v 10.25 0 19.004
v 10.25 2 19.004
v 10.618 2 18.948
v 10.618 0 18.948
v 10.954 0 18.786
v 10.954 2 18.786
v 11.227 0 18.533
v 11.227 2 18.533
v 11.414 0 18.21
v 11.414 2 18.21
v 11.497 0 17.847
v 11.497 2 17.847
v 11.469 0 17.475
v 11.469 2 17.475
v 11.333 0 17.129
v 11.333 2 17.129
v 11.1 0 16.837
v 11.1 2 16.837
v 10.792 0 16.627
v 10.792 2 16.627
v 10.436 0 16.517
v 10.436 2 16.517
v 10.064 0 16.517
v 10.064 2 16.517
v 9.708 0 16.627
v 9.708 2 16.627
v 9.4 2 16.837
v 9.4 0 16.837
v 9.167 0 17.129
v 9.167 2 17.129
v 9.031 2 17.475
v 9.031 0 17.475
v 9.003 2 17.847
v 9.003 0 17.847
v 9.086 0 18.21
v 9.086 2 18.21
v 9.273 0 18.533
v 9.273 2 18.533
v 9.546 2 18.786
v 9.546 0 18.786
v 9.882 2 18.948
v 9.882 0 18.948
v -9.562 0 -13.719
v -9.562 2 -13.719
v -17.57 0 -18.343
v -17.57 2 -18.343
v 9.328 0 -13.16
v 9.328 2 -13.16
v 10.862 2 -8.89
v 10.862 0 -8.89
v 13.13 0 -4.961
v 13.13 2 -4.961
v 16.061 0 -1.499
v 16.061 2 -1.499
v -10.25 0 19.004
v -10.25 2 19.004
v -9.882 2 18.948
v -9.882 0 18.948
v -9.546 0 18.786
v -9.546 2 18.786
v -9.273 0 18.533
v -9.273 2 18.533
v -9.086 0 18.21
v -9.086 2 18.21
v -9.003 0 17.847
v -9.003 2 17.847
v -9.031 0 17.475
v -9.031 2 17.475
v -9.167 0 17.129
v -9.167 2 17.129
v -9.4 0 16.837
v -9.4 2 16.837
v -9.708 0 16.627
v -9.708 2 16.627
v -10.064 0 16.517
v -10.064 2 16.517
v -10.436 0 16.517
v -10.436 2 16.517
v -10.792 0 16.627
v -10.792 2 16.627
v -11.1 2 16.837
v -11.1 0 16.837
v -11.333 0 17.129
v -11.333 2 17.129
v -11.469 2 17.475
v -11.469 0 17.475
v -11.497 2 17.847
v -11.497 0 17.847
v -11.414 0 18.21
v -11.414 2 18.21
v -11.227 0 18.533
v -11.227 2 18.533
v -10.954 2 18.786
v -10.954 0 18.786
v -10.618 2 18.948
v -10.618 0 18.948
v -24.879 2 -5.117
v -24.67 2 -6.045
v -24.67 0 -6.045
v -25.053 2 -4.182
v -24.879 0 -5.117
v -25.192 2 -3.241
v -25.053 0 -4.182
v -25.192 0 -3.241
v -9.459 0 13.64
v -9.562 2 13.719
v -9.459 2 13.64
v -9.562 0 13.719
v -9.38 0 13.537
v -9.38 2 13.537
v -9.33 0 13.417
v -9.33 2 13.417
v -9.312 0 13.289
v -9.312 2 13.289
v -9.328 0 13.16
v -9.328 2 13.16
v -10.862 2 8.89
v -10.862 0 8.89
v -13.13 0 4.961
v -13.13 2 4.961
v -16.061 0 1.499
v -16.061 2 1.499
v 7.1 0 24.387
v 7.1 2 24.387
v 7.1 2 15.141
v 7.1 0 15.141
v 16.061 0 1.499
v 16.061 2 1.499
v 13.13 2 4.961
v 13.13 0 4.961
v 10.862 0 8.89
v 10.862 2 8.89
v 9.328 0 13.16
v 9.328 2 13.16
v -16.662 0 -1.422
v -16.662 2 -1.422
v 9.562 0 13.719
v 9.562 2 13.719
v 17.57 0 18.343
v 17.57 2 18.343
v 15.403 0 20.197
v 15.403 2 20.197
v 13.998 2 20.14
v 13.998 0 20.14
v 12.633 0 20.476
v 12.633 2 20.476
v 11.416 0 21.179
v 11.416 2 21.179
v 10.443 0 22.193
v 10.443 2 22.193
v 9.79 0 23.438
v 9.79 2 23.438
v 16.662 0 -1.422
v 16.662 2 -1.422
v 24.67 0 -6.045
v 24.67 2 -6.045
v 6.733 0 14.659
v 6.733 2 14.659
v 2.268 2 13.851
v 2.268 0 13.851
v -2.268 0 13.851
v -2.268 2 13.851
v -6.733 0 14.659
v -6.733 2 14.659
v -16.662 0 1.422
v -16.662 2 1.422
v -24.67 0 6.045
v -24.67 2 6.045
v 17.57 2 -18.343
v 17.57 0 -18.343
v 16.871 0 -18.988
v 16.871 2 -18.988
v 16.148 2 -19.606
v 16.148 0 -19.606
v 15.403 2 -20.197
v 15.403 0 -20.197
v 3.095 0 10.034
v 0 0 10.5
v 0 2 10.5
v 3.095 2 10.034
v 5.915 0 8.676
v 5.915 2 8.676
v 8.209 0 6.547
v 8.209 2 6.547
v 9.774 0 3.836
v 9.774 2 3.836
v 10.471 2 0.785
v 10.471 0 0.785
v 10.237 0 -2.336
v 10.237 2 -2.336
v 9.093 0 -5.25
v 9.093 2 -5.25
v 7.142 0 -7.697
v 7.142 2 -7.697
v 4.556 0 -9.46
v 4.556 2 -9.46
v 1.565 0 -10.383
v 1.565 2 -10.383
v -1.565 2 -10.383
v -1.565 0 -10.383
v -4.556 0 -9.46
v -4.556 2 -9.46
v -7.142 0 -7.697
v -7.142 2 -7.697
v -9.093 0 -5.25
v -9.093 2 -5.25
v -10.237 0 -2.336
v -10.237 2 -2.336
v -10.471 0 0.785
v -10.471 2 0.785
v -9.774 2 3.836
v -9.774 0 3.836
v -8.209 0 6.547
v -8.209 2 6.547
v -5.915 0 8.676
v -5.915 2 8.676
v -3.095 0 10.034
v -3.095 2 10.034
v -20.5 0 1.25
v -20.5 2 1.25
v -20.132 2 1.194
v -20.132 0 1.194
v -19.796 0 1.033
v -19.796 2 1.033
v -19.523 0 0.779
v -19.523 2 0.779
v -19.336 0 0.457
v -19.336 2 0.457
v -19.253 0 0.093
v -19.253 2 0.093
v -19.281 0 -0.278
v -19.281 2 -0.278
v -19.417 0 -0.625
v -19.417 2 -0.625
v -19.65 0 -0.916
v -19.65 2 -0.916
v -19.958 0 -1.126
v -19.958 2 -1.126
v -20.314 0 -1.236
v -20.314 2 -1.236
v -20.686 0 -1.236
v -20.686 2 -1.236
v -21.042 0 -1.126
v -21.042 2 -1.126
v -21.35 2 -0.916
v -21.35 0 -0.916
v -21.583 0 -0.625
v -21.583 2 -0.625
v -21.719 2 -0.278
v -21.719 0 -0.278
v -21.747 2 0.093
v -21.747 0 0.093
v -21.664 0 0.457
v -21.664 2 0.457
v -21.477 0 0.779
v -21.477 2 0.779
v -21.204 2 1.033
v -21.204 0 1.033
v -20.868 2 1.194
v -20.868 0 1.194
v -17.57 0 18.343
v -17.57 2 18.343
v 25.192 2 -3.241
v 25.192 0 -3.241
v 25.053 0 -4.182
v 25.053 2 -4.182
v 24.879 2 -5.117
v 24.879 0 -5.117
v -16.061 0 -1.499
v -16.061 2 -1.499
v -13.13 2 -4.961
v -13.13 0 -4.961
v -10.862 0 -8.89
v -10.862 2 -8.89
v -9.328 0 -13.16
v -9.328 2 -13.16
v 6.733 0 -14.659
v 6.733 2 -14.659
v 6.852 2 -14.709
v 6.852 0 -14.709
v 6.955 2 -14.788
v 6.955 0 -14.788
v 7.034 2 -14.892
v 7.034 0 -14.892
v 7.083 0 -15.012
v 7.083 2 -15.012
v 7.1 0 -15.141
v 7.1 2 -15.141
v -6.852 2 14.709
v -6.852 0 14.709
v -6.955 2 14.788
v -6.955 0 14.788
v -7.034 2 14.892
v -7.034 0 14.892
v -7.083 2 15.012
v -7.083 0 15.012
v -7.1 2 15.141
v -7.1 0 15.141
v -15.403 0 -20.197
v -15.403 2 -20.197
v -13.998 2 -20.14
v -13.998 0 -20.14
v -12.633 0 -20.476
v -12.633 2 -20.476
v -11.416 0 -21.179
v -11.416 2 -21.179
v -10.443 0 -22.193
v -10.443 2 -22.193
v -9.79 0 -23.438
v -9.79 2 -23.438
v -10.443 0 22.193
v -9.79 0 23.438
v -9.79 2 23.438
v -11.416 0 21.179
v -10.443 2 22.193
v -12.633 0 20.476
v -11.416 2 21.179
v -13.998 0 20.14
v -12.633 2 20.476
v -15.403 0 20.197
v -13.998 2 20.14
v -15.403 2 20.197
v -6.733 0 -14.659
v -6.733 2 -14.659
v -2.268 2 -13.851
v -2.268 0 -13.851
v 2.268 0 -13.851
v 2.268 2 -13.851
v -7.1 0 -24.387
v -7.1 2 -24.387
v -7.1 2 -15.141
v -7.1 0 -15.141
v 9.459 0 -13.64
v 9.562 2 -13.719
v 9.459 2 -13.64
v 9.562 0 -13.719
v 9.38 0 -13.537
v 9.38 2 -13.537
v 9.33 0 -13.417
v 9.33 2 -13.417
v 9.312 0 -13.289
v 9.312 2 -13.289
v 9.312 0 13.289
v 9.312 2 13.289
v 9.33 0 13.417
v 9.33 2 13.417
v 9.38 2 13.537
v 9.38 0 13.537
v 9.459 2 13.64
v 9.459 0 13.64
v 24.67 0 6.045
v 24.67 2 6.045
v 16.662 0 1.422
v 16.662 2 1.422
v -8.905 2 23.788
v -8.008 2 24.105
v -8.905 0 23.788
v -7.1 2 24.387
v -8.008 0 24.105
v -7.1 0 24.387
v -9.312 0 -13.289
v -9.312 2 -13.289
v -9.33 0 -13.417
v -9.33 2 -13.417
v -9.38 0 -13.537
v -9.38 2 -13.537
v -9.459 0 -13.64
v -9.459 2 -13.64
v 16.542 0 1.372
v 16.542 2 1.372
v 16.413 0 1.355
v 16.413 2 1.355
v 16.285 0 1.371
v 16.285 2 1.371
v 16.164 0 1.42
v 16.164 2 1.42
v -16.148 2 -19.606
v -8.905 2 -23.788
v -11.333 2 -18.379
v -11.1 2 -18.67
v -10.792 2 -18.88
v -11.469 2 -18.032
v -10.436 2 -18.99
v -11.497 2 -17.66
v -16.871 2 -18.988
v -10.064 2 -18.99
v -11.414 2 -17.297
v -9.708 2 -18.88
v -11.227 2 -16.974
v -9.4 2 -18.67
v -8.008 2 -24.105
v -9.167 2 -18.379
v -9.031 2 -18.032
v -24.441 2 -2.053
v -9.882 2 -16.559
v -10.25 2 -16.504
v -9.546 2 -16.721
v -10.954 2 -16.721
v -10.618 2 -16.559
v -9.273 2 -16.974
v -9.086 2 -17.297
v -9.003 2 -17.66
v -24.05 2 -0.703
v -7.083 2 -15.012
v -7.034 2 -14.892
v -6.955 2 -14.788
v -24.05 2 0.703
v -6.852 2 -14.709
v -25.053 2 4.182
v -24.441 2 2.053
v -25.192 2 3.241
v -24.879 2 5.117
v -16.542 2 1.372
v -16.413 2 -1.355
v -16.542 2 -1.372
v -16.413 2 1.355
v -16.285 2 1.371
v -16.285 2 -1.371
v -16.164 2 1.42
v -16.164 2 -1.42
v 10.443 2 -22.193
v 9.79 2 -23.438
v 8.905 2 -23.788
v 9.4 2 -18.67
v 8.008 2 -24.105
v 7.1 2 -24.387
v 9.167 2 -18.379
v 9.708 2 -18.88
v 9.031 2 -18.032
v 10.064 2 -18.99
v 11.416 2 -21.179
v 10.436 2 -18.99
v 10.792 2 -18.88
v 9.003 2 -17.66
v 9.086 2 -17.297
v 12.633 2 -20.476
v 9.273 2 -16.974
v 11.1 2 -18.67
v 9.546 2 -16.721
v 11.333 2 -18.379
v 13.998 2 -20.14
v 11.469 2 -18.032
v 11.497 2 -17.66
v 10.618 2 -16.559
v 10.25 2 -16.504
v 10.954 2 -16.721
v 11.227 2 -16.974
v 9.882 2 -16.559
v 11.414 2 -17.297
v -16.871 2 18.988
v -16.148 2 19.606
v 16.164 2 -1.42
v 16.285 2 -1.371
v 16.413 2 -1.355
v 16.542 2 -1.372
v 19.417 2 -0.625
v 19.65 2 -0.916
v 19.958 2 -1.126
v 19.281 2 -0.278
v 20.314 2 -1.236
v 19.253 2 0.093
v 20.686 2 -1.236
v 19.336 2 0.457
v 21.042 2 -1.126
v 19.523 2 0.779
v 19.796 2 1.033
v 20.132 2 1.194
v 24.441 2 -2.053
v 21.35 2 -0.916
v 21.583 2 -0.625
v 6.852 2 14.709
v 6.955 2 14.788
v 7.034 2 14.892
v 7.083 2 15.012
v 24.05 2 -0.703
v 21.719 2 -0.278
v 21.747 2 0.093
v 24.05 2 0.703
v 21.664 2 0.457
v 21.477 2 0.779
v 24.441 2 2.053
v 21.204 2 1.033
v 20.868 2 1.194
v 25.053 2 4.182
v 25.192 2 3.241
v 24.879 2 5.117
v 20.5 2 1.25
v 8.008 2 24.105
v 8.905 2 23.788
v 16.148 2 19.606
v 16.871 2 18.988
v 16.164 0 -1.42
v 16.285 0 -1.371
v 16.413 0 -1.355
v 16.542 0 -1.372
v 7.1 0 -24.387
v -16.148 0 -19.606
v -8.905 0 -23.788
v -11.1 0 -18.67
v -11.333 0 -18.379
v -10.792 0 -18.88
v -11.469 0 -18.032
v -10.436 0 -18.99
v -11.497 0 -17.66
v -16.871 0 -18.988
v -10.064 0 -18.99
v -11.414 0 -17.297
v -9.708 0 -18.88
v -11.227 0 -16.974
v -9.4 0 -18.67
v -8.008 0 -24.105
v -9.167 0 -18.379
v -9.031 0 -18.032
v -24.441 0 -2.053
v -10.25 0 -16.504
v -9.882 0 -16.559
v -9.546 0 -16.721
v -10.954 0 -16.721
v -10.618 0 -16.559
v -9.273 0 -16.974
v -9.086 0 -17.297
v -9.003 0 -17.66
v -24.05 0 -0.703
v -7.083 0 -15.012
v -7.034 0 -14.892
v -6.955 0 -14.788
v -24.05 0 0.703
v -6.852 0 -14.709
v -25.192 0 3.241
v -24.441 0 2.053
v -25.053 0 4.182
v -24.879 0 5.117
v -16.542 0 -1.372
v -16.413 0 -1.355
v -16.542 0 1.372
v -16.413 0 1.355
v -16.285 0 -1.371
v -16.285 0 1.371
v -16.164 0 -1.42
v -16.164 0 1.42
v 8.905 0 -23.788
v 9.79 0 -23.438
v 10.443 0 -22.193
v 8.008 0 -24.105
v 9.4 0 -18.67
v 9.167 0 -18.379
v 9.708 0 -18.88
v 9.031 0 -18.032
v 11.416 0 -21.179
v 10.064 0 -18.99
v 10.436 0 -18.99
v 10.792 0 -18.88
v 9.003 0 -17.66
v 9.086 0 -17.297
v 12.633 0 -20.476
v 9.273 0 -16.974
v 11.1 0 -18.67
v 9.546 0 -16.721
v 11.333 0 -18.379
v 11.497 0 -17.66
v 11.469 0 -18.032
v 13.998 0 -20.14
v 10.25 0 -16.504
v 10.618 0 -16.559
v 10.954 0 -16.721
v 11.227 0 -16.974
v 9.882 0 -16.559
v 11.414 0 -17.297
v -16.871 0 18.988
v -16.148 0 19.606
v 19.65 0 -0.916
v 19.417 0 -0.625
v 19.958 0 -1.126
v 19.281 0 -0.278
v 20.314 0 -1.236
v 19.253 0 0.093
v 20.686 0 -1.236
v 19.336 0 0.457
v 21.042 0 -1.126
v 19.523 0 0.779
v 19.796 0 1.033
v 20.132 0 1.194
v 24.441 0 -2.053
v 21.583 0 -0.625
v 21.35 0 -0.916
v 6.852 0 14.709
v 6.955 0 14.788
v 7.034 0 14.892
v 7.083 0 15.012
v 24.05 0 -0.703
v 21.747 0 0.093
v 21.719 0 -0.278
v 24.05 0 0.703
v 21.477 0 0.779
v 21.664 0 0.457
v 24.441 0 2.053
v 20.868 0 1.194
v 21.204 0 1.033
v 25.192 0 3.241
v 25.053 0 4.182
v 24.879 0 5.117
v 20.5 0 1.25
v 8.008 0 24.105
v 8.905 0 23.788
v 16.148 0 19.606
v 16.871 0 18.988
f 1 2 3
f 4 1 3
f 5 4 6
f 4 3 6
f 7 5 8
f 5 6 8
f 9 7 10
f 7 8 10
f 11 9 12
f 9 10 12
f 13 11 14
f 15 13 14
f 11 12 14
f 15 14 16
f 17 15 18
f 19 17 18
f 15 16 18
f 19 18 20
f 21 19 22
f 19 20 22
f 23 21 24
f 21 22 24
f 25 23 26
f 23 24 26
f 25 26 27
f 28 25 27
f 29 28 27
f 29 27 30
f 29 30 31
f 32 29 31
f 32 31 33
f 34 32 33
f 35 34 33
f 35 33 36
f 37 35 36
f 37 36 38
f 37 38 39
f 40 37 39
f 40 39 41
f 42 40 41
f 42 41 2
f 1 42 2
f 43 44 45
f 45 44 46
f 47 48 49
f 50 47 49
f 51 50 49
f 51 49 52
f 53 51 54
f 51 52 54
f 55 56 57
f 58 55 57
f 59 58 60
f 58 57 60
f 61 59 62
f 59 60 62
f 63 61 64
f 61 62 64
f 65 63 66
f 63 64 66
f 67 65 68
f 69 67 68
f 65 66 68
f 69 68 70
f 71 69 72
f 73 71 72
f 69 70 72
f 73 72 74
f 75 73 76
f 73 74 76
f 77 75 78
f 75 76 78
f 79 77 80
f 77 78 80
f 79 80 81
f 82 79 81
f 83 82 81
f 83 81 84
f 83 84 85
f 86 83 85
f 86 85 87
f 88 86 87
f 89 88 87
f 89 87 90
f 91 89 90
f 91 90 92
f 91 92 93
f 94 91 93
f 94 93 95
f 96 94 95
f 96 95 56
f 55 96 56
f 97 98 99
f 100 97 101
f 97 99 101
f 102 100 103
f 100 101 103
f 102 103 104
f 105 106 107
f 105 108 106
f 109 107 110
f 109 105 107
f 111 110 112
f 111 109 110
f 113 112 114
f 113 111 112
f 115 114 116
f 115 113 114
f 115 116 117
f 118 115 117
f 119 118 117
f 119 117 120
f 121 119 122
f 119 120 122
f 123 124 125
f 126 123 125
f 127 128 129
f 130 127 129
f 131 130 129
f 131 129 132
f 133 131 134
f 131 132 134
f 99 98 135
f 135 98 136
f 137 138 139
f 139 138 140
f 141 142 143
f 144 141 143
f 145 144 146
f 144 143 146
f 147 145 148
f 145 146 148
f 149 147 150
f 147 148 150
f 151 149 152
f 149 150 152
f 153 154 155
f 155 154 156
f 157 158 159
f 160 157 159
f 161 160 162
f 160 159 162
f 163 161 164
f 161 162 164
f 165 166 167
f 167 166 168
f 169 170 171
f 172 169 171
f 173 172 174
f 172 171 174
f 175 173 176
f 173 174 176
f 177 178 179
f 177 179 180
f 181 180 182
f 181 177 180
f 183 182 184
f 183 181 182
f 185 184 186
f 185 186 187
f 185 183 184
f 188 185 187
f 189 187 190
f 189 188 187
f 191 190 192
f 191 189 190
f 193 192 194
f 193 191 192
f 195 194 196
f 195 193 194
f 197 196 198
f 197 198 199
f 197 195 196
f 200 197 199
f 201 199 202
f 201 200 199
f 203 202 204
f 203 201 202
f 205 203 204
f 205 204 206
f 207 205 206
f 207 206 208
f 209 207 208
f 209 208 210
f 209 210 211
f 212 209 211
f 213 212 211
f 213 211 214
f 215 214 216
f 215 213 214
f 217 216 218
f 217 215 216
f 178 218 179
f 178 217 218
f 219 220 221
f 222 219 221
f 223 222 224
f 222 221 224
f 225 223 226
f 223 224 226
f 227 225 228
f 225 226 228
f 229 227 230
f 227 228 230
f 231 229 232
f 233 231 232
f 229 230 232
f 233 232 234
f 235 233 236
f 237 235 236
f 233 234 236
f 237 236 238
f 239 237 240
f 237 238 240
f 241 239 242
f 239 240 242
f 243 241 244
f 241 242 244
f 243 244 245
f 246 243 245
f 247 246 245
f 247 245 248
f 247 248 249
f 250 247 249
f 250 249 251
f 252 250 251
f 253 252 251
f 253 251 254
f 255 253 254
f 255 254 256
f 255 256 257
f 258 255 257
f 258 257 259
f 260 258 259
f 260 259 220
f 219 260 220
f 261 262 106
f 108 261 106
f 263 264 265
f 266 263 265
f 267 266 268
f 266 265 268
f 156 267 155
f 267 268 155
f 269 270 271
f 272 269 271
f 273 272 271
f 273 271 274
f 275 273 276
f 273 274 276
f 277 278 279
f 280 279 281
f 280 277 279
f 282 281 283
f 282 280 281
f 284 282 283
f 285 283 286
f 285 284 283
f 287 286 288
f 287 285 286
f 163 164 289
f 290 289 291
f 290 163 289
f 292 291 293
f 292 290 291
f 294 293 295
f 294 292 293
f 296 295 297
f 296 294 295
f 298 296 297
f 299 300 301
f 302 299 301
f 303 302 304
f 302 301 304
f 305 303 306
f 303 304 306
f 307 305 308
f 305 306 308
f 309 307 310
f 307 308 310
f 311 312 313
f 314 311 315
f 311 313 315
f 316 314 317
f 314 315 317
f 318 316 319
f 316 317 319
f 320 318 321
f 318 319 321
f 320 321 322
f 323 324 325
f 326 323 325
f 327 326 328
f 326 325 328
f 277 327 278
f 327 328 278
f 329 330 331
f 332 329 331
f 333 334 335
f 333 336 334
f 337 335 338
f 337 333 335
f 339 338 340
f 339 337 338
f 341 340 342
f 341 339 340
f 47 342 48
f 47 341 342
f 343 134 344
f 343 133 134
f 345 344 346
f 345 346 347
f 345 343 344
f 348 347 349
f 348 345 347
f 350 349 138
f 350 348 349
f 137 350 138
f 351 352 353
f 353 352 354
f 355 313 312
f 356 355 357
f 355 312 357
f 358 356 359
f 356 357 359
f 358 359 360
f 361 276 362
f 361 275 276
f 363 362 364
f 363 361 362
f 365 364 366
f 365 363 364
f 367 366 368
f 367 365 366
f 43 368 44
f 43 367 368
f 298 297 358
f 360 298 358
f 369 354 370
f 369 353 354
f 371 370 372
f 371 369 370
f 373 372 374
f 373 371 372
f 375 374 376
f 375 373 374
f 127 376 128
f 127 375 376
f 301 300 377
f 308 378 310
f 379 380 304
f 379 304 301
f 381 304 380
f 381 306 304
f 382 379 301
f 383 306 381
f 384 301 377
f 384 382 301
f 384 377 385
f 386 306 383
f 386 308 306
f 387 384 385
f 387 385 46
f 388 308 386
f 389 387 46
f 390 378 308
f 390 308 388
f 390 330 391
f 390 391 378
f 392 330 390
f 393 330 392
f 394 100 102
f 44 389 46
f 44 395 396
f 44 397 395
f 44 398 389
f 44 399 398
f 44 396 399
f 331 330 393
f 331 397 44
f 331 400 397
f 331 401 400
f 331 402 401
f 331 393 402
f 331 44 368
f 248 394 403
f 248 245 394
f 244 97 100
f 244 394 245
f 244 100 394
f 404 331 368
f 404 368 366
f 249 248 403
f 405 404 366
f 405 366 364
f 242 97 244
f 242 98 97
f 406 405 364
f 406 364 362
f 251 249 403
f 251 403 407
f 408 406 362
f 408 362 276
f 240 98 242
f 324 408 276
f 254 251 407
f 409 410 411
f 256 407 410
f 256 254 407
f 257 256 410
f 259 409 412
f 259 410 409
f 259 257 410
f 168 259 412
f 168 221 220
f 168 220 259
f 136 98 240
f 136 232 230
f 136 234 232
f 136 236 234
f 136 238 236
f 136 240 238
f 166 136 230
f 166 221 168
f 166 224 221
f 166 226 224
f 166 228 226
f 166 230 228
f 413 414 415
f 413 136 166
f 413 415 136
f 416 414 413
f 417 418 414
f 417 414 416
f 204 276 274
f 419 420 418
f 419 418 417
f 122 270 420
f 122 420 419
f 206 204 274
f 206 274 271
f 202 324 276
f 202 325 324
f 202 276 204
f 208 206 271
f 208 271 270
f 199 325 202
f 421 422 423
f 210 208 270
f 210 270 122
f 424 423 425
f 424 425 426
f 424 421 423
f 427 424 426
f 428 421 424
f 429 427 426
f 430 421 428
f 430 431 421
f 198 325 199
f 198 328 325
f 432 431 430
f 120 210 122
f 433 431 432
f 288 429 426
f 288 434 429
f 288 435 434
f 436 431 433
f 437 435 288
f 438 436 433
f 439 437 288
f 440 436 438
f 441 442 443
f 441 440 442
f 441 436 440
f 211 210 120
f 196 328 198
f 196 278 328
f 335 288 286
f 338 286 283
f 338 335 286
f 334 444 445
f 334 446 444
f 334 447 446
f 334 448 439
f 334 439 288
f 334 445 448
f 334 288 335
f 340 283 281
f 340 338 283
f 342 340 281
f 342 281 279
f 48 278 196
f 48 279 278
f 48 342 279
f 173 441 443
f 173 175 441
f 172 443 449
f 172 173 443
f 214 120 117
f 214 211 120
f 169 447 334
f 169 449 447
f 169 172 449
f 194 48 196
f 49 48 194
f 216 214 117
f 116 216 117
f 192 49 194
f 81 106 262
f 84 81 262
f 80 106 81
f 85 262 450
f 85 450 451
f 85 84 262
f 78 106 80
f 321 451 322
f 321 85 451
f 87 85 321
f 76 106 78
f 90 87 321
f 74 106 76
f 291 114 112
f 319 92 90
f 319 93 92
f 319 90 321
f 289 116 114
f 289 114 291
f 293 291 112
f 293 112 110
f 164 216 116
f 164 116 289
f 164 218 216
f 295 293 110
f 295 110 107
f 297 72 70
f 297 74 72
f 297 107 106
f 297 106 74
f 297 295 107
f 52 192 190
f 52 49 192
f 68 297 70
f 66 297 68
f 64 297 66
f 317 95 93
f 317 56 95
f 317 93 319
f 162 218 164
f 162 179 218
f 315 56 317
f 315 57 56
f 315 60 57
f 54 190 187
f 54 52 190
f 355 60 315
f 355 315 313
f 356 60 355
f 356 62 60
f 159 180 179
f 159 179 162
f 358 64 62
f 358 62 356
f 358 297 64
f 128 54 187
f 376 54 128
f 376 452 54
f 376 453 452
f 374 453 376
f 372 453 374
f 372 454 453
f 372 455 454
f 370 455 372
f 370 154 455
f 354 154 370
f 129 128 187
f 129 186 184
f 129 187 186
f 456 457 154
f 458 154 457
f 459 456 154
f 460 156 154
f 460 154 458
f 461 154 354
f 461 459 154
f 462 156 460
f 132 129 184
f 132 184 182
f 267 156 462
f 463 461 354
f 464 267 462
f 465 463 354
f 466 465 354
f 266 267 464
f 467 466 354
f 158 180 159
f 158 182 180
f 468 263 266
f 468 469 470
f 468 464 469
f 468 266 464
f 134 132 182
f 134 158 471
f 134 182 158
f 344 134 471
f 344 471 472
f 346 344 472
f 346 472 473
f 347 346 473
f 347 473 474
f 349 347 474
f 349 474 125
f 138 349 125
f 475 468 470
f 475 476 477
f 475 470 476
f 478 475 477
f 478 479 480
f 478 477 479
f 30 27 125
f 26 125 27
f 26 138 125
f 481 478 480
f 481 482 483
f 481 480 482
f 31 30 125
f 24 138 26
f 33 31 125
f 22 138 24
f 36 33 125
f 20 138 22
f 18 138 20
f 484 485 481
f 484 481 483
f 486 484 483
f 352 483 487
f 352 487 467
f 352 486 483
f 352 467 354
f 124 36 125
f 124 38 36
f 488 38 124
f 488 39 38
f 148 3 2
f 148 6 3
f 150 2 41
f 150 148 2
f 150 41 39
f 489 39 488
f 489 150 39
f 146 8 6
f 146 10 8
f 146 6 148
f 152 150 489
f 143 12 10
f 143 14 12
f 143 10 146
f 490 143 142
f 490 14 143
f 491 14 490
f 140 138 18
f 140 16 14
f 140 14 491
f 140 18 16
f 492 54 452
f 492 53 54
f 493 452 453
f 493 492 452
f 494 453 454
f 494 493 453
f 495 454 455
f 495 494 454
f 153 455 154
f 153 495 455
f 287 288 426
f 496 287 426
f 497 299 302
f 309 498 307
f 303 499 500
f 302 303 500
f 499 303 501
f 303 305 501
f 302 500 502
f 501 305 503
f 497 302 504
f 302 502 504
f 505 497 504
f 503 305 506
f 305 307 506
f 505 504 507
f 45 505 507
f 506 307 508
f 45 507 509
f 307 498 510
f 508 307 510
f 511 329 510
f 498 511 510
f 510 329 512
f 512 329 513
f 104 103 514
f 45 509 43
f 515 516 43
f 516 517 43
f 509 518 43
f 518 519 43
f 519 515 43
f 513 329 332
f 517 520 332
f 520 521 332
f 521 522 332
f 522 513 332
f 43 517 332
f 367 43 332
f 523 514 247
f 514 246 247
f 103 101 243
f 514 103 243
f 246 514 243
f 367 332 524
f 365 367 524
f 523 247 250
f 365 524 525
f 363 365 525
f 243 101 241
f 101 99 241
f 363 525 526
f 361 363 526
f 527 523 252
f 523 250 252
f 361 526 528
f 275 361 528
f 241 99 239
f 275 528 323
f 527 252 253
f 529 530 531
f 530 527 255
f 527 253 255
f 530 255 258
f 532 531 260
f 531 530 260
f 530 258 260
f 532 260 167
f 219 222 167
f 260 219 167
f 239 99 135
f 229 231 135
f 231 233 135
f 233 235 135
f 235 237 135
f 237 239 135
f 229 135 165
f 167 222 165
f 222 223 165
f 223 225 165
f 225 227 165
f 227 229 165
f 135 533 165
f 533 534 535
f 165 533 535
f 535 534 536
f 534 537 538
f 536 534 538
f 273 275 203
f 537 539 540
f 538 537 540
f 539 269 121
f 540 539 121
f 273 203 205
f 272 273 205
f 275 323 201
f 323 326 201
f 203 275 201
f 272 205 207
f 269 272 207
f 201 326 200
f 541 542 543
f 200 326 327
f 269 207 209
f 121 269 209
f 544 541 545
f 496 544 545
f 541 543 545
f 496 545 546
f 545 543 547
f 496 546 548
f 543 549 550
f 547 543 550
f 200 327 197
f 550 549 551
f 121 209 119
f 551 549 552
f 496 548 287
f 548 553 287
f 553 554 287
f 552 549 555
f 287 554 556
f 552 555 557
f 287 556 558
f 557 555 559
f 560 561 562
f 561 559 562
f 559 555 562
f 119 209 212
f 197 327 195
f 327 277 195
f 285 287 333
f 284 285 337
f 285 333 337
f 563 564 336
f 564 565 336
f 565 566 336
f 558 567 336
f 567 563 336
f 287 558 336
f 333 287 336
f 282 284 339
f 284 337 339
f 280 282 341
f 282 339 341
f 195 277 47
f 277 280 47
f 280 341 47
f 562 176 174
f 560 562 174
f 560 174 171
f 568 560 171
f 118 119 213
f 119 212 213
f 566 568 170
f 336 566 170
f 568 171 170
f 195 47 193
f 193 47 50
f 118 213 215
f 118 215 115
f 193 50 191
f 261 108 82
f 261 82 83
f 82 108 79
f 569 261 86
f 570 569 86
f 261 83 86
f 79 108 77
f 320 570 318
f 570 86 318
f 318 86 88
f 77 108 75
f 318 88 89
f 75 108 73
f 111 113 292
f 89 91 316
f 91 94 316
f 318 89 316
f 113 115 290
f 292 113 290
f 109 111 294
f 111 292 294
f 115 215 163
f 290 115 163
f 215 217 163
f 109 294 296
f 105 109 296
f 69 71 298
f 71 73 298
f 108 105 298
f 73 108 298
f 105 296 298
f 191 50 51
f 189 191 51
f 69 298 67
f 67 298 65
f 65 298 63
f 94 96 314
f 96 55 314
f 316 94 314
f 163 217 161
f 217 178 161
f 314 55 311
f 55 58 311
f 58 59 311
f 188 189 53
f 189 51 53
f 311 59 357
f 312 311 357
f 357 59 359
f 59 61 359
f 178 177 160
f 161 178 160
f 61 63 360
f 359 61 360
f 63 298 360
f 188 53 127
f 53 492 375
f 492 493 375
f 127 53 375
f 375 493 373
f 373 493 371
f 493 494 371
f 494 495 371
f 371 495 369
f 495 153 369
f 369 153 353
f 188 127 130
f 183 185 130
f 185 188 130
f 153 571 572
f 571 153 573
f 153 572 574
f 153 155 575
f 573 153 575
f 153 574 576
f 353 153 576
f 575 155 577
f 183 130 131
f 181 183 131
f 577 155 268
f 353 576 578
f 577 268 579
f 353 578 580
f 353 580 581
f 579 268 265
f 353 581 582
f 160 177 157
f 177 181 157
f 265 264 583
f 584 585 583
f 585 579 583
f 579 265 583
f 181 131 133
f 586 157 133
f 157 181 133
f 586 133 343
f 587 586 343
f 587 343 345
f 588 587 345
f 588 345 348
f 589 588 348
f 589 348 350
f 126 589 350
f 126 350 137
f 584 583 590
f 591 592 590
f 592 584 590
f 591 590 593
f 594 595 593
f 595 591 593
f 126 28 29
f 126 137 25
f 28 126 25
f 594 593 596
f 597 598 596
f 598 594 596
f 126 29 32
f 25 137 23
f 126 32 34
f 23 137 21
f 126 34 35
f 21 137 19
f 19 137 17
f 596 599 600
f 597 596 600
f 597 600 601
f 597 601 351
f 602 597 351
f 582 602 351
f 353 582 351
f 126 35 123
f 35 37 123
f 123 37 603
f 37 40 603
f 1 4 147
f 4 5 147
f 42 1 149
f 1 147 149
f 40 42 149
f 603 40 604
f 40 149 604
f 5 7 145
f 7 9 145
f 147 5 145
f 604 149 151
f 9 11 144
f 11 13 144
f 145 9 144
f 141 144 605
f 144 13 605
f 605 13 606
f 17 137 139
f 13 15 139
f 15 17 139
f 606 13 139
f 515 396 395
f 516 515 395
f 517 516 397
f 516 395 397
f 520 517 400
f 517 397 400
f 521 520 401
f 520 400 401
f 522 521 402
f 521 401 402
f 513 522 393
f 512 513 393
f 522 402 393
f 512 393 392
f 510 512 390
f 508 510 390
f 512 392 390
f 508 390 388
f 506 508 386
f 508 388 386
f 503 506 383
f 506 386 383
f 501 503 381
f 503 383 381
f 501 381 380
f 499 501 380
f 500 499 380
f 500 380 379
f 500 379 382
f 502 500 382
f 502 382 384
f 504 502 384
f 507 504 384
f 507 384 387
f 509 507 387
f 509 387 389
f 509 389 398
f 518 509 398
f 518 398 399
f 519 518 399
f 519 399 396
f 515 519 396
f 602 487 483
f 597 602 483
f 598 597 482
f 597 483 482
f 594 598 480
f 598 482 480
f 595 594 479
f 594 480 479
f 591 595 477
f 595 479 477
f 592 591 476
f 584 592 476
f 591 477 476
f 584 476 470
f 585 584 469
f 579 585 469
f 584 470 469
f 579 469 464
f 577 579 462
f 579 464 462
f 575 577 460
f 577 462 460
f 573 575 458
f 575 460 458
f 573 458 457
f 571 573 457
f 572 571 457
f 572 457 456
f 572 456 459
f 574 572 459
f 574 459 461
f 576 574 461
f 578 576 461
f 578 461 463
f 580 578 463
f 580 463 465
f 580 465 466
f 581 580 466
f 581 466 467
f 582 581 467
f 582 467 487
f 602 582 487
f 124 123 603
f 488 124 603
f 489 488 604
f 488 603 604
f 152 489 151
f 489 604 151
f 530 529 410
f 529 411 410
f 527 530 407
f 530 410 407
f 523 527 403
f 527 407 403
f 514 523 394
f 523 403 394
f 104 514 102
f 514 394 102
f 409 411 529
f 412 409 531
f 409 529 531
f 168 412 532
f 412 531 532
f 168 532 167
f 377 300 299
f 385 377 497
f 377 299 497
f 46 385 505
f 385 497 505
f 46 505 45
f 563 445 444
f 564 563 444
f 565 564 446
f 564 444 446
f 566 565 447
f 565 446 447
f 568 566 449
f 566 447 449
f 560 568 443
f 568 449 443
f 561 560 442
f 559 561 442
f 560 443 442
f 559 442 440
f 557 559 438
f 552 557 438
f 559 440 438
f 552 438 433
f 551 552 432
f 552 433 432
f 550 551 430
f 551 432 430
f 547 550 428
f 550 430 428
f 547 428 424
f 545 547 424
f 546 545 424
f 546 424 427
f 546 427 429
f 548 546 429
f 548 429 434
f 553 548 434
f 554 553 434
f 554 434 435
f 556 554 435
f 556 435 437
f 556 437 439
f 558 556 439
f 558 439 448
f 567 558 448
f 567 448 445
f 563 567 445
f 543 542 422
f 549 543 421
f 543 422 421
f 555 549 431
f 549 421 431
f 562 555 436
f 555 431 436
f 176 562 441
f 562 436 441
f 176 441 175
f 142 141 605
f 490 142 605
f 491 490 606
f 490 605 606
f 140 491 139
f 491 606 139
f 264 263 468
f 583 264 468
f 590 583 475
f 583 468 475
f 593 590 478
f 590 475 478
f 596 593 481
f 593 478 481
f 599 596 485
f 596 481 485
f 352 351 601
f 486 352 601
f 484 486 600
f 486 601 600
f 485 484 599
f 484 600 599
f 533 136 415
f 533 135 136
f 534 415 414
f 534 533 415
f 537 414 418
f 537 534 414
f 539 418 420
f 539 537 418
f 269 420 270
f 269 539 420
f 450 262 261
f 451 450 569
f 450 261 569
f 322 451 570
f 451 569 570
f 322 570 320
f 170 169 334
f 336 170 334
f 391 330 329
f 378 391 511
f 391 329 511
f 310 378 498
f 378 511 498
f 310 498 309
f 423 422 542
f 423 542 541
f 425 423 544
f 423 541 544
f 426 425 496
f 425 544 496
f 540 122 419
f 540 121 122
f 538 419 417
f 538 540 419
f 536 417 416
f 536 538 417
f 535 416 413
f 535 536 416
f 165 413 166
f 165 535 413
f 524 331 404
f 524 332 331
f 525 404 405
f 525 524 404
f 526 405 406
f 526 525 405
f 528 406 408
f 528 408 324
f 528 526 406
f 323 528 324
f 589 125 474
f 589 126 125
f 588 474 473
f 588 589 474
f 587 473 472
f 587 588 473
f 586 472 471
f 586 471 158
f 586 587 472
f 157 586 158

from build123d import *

# Parameters (mm, degrees)
SKETCH_1_R          = 25.4
SKETCH_1_R_2        = 10.5
EXTRUDE_1_DEPTH     = 2
CUT_EXTRUDE_1_DEPTH = 36.9766591
SKETCH_3_R          = 1.25
SKETCH_3_R_2        = 5
CUT_EXTRUDE_2_DEPTH = 36.269108296
FILLET_1_R          = 0.5


with BuildPart() as part:
    # 草图1 → 凸台-拉伸1 (new body)
    with BuildSketch(Plane(origin=(0, 0, 0), x_dir=(1, 0, 0), z_dir=(0, 1, 0))):
        with Locations(Location((0, 0, 0), (0, 0, 270))):
            Circle(SKETCH_1_R)
        with Locations(Location((0, 0, 0), (0, 0, 270))):
            Circle(SKETCH_1_R_2, mode=Mode.SUBTRACT)
    extrude(amount=EXTRUDE_1_DEPTH)

    # 草图2 → 切除-拉伸1 (cut, through all)
    with BuildSketch(Plane(origin=(0, 2, 0), x_dir=(1, 0, 0), z_dir=(0, 1, 0))):
        with BuildLine():
            Line((-7.1, 24.387496797), (-7.1, 14.762503203))
            ThreePointArc((-7.1, 14.762503203), (0, 13.75), (7.1, 14.762503203))
            Line((7.1, 14.762503203), (7.1, 24.387496797))
            ThreePointArc((7.1, 24.387496797), (0, 25.4), (-7.1, 24.387496797))
        make_face()
        with BuildLine():
            Line((17.57019176, 18.342528765), (9.234702798, 13.530031969))
            ThreePointArc((9.234702798, 13.530031969), (11.907849302, 6.875), (16.334702798, 1.232471235))
            Line((16.334702798, 1.232471235), (24.67019176, 6.044968031))
            ThreePointArc((24.67019176, 6.044968031), (21.997045256, 12.7), (17.57019176, 18.342528765))
        make_face()
        with BuildLine():
            Line((24.67019176, -6.044968031), (16.334702798, -1.232471235))
            ThreePointArc((16.334702798, -1.232471235), (11.907849302, -6.875), (9.234702798, -13.530031969))
            Line((9.234702798, -13.530031969), (17.57019176, -18.342528765))
            ThreePointArc((17.57019176, -18.342528765), (21.997045256, -12.7), (24.67019176, -6.044968031))
        make_face()
        with BuildLine():
            Line((7.1, -24.387496797), (7.1, -14.762503203))
            ThreePointArc((7.1, -14.762503203), (0, -13.75), (-7.1, -14.762503203))
            Line((-7.1, -14.762503203), (-7.1, -24.387496797))
            ThreePointArc((-7.1, -24.387496797), (0, -25.4), (7.1, -24.387496797))
        make_face()
        with BuildLine():
            Line((-17.57019176, -18.342528765), (-9.234702798, -13.530031969))
            ThreePointArc((-9.234702798, -13.530031969), (-11.907849302, -6.875), (-16.334702798, -1.232471235))
            Line((-16.334702798, -1.232471235), (-24.67019176, -6.044968031))
            ThreePointArc((-24.67019176, -6.044968031), (-21.997045256, -12.7), (-17.57019176, -18.342528765))
        make_face()
        with BuildLine():
            Line((-24.67019176, 6.044968031), (-16.334702798, 1.232471235))
            ThreePointArc((-16.334702798, 1.232471235), (-11.907849302, 6.875), (-9.234702798, 13.530031969))
            Line((-9.234702798, 13.530031969), (-17.57019176, 18.342528765))
            ThreePointArc((-17.57019176, 18.342528765), (-21.997045256, 12.7), (-24.67019176, 6.044968031))
        make_face()
    extrude(amount=-CUT_EXTRUDE_1_DEPTH, mode=Mode.SUBTRACT)

    # 草图3 → 切除-拉伸2 (cut, through all)
    with BuildSketch(Plane(origin=(0, 2, 0), x_dir=(1, 0, 0), z_dir=(0, 1, 0))):
        with Locations(Location((-10.25, 17.753520778, 0), (0, 0, 270))):
            Circle(SKETCH_3_R)
        with Locations(Location((10.25, 17.753520778, 0), (0, 0, 270))):
            Circle(SKETCH_3_R)
        with Locations(Location((20.5, 0, 0), (0, 0, 270))):
            Circle(SKETCH_3_R)
        with Locations(Location((10.25, -17.753520778, 0), (0, 0, 270))):
            Circle(SKETCH_3_R)
        with Locations(Location((-10.25, -17.753520778, 0), (0, 0, 270))):
            Circle(SKETCH_3_R)
        with Locations(Location((-20.5, 0, 0), (0, 0, 270))):
            Circle(SKETCH_3_R)
        with Locations((-29, 0)):
            Circle(SKETCH_3_R_2)
        with Locations((-14.5, 25.11473671)):
            Circle(SKETCH_3_R_2)
        with Locations((14.5, 25.11473671)):
            Circle(SKETCH_3_R_2)
        with Locations((29, 0)):
            Circle(SKETCH_3_R_2)
        with Locations((14.5, -25.11473671)):
            Circle(SKETCH_3_R_2)
        with Locations((-14.5, -25.11473671)):
            Circle(SKETCH_3_R_2)
    extrude(amount=-CUT_EXTRUDE_2_DEPTH, mode=Mode.SUBTRACT)

    # 圆角1
    fillet_1_edges = [part.edges().sort_by_distance(p)[0] for p in [
        (16.334702798, 1, -1.232471235),
        (9.234702798, 1, -13.530031969),
        (9.234702798, 1, 13.530031969),
        (16.334702798, 1, 1.232471235),
        (-7.1, 1, 14.762503203),
        (7.1, 1, 14.762503203),
        (-16.334702798, 1, 1.232471235),
        (-9.234702798, 1, 13.530031969),
        (-9.234702798, 1, -13.530031969),
        (-16.334702798, 1, -1.232471235),
        (7.1, 1, -14.762503203),
        (-7.1, 1, -14.762503203),
    ]]
    fillet(fillet_1_edges, radius=FILLET_1_R)


solid = part.part
